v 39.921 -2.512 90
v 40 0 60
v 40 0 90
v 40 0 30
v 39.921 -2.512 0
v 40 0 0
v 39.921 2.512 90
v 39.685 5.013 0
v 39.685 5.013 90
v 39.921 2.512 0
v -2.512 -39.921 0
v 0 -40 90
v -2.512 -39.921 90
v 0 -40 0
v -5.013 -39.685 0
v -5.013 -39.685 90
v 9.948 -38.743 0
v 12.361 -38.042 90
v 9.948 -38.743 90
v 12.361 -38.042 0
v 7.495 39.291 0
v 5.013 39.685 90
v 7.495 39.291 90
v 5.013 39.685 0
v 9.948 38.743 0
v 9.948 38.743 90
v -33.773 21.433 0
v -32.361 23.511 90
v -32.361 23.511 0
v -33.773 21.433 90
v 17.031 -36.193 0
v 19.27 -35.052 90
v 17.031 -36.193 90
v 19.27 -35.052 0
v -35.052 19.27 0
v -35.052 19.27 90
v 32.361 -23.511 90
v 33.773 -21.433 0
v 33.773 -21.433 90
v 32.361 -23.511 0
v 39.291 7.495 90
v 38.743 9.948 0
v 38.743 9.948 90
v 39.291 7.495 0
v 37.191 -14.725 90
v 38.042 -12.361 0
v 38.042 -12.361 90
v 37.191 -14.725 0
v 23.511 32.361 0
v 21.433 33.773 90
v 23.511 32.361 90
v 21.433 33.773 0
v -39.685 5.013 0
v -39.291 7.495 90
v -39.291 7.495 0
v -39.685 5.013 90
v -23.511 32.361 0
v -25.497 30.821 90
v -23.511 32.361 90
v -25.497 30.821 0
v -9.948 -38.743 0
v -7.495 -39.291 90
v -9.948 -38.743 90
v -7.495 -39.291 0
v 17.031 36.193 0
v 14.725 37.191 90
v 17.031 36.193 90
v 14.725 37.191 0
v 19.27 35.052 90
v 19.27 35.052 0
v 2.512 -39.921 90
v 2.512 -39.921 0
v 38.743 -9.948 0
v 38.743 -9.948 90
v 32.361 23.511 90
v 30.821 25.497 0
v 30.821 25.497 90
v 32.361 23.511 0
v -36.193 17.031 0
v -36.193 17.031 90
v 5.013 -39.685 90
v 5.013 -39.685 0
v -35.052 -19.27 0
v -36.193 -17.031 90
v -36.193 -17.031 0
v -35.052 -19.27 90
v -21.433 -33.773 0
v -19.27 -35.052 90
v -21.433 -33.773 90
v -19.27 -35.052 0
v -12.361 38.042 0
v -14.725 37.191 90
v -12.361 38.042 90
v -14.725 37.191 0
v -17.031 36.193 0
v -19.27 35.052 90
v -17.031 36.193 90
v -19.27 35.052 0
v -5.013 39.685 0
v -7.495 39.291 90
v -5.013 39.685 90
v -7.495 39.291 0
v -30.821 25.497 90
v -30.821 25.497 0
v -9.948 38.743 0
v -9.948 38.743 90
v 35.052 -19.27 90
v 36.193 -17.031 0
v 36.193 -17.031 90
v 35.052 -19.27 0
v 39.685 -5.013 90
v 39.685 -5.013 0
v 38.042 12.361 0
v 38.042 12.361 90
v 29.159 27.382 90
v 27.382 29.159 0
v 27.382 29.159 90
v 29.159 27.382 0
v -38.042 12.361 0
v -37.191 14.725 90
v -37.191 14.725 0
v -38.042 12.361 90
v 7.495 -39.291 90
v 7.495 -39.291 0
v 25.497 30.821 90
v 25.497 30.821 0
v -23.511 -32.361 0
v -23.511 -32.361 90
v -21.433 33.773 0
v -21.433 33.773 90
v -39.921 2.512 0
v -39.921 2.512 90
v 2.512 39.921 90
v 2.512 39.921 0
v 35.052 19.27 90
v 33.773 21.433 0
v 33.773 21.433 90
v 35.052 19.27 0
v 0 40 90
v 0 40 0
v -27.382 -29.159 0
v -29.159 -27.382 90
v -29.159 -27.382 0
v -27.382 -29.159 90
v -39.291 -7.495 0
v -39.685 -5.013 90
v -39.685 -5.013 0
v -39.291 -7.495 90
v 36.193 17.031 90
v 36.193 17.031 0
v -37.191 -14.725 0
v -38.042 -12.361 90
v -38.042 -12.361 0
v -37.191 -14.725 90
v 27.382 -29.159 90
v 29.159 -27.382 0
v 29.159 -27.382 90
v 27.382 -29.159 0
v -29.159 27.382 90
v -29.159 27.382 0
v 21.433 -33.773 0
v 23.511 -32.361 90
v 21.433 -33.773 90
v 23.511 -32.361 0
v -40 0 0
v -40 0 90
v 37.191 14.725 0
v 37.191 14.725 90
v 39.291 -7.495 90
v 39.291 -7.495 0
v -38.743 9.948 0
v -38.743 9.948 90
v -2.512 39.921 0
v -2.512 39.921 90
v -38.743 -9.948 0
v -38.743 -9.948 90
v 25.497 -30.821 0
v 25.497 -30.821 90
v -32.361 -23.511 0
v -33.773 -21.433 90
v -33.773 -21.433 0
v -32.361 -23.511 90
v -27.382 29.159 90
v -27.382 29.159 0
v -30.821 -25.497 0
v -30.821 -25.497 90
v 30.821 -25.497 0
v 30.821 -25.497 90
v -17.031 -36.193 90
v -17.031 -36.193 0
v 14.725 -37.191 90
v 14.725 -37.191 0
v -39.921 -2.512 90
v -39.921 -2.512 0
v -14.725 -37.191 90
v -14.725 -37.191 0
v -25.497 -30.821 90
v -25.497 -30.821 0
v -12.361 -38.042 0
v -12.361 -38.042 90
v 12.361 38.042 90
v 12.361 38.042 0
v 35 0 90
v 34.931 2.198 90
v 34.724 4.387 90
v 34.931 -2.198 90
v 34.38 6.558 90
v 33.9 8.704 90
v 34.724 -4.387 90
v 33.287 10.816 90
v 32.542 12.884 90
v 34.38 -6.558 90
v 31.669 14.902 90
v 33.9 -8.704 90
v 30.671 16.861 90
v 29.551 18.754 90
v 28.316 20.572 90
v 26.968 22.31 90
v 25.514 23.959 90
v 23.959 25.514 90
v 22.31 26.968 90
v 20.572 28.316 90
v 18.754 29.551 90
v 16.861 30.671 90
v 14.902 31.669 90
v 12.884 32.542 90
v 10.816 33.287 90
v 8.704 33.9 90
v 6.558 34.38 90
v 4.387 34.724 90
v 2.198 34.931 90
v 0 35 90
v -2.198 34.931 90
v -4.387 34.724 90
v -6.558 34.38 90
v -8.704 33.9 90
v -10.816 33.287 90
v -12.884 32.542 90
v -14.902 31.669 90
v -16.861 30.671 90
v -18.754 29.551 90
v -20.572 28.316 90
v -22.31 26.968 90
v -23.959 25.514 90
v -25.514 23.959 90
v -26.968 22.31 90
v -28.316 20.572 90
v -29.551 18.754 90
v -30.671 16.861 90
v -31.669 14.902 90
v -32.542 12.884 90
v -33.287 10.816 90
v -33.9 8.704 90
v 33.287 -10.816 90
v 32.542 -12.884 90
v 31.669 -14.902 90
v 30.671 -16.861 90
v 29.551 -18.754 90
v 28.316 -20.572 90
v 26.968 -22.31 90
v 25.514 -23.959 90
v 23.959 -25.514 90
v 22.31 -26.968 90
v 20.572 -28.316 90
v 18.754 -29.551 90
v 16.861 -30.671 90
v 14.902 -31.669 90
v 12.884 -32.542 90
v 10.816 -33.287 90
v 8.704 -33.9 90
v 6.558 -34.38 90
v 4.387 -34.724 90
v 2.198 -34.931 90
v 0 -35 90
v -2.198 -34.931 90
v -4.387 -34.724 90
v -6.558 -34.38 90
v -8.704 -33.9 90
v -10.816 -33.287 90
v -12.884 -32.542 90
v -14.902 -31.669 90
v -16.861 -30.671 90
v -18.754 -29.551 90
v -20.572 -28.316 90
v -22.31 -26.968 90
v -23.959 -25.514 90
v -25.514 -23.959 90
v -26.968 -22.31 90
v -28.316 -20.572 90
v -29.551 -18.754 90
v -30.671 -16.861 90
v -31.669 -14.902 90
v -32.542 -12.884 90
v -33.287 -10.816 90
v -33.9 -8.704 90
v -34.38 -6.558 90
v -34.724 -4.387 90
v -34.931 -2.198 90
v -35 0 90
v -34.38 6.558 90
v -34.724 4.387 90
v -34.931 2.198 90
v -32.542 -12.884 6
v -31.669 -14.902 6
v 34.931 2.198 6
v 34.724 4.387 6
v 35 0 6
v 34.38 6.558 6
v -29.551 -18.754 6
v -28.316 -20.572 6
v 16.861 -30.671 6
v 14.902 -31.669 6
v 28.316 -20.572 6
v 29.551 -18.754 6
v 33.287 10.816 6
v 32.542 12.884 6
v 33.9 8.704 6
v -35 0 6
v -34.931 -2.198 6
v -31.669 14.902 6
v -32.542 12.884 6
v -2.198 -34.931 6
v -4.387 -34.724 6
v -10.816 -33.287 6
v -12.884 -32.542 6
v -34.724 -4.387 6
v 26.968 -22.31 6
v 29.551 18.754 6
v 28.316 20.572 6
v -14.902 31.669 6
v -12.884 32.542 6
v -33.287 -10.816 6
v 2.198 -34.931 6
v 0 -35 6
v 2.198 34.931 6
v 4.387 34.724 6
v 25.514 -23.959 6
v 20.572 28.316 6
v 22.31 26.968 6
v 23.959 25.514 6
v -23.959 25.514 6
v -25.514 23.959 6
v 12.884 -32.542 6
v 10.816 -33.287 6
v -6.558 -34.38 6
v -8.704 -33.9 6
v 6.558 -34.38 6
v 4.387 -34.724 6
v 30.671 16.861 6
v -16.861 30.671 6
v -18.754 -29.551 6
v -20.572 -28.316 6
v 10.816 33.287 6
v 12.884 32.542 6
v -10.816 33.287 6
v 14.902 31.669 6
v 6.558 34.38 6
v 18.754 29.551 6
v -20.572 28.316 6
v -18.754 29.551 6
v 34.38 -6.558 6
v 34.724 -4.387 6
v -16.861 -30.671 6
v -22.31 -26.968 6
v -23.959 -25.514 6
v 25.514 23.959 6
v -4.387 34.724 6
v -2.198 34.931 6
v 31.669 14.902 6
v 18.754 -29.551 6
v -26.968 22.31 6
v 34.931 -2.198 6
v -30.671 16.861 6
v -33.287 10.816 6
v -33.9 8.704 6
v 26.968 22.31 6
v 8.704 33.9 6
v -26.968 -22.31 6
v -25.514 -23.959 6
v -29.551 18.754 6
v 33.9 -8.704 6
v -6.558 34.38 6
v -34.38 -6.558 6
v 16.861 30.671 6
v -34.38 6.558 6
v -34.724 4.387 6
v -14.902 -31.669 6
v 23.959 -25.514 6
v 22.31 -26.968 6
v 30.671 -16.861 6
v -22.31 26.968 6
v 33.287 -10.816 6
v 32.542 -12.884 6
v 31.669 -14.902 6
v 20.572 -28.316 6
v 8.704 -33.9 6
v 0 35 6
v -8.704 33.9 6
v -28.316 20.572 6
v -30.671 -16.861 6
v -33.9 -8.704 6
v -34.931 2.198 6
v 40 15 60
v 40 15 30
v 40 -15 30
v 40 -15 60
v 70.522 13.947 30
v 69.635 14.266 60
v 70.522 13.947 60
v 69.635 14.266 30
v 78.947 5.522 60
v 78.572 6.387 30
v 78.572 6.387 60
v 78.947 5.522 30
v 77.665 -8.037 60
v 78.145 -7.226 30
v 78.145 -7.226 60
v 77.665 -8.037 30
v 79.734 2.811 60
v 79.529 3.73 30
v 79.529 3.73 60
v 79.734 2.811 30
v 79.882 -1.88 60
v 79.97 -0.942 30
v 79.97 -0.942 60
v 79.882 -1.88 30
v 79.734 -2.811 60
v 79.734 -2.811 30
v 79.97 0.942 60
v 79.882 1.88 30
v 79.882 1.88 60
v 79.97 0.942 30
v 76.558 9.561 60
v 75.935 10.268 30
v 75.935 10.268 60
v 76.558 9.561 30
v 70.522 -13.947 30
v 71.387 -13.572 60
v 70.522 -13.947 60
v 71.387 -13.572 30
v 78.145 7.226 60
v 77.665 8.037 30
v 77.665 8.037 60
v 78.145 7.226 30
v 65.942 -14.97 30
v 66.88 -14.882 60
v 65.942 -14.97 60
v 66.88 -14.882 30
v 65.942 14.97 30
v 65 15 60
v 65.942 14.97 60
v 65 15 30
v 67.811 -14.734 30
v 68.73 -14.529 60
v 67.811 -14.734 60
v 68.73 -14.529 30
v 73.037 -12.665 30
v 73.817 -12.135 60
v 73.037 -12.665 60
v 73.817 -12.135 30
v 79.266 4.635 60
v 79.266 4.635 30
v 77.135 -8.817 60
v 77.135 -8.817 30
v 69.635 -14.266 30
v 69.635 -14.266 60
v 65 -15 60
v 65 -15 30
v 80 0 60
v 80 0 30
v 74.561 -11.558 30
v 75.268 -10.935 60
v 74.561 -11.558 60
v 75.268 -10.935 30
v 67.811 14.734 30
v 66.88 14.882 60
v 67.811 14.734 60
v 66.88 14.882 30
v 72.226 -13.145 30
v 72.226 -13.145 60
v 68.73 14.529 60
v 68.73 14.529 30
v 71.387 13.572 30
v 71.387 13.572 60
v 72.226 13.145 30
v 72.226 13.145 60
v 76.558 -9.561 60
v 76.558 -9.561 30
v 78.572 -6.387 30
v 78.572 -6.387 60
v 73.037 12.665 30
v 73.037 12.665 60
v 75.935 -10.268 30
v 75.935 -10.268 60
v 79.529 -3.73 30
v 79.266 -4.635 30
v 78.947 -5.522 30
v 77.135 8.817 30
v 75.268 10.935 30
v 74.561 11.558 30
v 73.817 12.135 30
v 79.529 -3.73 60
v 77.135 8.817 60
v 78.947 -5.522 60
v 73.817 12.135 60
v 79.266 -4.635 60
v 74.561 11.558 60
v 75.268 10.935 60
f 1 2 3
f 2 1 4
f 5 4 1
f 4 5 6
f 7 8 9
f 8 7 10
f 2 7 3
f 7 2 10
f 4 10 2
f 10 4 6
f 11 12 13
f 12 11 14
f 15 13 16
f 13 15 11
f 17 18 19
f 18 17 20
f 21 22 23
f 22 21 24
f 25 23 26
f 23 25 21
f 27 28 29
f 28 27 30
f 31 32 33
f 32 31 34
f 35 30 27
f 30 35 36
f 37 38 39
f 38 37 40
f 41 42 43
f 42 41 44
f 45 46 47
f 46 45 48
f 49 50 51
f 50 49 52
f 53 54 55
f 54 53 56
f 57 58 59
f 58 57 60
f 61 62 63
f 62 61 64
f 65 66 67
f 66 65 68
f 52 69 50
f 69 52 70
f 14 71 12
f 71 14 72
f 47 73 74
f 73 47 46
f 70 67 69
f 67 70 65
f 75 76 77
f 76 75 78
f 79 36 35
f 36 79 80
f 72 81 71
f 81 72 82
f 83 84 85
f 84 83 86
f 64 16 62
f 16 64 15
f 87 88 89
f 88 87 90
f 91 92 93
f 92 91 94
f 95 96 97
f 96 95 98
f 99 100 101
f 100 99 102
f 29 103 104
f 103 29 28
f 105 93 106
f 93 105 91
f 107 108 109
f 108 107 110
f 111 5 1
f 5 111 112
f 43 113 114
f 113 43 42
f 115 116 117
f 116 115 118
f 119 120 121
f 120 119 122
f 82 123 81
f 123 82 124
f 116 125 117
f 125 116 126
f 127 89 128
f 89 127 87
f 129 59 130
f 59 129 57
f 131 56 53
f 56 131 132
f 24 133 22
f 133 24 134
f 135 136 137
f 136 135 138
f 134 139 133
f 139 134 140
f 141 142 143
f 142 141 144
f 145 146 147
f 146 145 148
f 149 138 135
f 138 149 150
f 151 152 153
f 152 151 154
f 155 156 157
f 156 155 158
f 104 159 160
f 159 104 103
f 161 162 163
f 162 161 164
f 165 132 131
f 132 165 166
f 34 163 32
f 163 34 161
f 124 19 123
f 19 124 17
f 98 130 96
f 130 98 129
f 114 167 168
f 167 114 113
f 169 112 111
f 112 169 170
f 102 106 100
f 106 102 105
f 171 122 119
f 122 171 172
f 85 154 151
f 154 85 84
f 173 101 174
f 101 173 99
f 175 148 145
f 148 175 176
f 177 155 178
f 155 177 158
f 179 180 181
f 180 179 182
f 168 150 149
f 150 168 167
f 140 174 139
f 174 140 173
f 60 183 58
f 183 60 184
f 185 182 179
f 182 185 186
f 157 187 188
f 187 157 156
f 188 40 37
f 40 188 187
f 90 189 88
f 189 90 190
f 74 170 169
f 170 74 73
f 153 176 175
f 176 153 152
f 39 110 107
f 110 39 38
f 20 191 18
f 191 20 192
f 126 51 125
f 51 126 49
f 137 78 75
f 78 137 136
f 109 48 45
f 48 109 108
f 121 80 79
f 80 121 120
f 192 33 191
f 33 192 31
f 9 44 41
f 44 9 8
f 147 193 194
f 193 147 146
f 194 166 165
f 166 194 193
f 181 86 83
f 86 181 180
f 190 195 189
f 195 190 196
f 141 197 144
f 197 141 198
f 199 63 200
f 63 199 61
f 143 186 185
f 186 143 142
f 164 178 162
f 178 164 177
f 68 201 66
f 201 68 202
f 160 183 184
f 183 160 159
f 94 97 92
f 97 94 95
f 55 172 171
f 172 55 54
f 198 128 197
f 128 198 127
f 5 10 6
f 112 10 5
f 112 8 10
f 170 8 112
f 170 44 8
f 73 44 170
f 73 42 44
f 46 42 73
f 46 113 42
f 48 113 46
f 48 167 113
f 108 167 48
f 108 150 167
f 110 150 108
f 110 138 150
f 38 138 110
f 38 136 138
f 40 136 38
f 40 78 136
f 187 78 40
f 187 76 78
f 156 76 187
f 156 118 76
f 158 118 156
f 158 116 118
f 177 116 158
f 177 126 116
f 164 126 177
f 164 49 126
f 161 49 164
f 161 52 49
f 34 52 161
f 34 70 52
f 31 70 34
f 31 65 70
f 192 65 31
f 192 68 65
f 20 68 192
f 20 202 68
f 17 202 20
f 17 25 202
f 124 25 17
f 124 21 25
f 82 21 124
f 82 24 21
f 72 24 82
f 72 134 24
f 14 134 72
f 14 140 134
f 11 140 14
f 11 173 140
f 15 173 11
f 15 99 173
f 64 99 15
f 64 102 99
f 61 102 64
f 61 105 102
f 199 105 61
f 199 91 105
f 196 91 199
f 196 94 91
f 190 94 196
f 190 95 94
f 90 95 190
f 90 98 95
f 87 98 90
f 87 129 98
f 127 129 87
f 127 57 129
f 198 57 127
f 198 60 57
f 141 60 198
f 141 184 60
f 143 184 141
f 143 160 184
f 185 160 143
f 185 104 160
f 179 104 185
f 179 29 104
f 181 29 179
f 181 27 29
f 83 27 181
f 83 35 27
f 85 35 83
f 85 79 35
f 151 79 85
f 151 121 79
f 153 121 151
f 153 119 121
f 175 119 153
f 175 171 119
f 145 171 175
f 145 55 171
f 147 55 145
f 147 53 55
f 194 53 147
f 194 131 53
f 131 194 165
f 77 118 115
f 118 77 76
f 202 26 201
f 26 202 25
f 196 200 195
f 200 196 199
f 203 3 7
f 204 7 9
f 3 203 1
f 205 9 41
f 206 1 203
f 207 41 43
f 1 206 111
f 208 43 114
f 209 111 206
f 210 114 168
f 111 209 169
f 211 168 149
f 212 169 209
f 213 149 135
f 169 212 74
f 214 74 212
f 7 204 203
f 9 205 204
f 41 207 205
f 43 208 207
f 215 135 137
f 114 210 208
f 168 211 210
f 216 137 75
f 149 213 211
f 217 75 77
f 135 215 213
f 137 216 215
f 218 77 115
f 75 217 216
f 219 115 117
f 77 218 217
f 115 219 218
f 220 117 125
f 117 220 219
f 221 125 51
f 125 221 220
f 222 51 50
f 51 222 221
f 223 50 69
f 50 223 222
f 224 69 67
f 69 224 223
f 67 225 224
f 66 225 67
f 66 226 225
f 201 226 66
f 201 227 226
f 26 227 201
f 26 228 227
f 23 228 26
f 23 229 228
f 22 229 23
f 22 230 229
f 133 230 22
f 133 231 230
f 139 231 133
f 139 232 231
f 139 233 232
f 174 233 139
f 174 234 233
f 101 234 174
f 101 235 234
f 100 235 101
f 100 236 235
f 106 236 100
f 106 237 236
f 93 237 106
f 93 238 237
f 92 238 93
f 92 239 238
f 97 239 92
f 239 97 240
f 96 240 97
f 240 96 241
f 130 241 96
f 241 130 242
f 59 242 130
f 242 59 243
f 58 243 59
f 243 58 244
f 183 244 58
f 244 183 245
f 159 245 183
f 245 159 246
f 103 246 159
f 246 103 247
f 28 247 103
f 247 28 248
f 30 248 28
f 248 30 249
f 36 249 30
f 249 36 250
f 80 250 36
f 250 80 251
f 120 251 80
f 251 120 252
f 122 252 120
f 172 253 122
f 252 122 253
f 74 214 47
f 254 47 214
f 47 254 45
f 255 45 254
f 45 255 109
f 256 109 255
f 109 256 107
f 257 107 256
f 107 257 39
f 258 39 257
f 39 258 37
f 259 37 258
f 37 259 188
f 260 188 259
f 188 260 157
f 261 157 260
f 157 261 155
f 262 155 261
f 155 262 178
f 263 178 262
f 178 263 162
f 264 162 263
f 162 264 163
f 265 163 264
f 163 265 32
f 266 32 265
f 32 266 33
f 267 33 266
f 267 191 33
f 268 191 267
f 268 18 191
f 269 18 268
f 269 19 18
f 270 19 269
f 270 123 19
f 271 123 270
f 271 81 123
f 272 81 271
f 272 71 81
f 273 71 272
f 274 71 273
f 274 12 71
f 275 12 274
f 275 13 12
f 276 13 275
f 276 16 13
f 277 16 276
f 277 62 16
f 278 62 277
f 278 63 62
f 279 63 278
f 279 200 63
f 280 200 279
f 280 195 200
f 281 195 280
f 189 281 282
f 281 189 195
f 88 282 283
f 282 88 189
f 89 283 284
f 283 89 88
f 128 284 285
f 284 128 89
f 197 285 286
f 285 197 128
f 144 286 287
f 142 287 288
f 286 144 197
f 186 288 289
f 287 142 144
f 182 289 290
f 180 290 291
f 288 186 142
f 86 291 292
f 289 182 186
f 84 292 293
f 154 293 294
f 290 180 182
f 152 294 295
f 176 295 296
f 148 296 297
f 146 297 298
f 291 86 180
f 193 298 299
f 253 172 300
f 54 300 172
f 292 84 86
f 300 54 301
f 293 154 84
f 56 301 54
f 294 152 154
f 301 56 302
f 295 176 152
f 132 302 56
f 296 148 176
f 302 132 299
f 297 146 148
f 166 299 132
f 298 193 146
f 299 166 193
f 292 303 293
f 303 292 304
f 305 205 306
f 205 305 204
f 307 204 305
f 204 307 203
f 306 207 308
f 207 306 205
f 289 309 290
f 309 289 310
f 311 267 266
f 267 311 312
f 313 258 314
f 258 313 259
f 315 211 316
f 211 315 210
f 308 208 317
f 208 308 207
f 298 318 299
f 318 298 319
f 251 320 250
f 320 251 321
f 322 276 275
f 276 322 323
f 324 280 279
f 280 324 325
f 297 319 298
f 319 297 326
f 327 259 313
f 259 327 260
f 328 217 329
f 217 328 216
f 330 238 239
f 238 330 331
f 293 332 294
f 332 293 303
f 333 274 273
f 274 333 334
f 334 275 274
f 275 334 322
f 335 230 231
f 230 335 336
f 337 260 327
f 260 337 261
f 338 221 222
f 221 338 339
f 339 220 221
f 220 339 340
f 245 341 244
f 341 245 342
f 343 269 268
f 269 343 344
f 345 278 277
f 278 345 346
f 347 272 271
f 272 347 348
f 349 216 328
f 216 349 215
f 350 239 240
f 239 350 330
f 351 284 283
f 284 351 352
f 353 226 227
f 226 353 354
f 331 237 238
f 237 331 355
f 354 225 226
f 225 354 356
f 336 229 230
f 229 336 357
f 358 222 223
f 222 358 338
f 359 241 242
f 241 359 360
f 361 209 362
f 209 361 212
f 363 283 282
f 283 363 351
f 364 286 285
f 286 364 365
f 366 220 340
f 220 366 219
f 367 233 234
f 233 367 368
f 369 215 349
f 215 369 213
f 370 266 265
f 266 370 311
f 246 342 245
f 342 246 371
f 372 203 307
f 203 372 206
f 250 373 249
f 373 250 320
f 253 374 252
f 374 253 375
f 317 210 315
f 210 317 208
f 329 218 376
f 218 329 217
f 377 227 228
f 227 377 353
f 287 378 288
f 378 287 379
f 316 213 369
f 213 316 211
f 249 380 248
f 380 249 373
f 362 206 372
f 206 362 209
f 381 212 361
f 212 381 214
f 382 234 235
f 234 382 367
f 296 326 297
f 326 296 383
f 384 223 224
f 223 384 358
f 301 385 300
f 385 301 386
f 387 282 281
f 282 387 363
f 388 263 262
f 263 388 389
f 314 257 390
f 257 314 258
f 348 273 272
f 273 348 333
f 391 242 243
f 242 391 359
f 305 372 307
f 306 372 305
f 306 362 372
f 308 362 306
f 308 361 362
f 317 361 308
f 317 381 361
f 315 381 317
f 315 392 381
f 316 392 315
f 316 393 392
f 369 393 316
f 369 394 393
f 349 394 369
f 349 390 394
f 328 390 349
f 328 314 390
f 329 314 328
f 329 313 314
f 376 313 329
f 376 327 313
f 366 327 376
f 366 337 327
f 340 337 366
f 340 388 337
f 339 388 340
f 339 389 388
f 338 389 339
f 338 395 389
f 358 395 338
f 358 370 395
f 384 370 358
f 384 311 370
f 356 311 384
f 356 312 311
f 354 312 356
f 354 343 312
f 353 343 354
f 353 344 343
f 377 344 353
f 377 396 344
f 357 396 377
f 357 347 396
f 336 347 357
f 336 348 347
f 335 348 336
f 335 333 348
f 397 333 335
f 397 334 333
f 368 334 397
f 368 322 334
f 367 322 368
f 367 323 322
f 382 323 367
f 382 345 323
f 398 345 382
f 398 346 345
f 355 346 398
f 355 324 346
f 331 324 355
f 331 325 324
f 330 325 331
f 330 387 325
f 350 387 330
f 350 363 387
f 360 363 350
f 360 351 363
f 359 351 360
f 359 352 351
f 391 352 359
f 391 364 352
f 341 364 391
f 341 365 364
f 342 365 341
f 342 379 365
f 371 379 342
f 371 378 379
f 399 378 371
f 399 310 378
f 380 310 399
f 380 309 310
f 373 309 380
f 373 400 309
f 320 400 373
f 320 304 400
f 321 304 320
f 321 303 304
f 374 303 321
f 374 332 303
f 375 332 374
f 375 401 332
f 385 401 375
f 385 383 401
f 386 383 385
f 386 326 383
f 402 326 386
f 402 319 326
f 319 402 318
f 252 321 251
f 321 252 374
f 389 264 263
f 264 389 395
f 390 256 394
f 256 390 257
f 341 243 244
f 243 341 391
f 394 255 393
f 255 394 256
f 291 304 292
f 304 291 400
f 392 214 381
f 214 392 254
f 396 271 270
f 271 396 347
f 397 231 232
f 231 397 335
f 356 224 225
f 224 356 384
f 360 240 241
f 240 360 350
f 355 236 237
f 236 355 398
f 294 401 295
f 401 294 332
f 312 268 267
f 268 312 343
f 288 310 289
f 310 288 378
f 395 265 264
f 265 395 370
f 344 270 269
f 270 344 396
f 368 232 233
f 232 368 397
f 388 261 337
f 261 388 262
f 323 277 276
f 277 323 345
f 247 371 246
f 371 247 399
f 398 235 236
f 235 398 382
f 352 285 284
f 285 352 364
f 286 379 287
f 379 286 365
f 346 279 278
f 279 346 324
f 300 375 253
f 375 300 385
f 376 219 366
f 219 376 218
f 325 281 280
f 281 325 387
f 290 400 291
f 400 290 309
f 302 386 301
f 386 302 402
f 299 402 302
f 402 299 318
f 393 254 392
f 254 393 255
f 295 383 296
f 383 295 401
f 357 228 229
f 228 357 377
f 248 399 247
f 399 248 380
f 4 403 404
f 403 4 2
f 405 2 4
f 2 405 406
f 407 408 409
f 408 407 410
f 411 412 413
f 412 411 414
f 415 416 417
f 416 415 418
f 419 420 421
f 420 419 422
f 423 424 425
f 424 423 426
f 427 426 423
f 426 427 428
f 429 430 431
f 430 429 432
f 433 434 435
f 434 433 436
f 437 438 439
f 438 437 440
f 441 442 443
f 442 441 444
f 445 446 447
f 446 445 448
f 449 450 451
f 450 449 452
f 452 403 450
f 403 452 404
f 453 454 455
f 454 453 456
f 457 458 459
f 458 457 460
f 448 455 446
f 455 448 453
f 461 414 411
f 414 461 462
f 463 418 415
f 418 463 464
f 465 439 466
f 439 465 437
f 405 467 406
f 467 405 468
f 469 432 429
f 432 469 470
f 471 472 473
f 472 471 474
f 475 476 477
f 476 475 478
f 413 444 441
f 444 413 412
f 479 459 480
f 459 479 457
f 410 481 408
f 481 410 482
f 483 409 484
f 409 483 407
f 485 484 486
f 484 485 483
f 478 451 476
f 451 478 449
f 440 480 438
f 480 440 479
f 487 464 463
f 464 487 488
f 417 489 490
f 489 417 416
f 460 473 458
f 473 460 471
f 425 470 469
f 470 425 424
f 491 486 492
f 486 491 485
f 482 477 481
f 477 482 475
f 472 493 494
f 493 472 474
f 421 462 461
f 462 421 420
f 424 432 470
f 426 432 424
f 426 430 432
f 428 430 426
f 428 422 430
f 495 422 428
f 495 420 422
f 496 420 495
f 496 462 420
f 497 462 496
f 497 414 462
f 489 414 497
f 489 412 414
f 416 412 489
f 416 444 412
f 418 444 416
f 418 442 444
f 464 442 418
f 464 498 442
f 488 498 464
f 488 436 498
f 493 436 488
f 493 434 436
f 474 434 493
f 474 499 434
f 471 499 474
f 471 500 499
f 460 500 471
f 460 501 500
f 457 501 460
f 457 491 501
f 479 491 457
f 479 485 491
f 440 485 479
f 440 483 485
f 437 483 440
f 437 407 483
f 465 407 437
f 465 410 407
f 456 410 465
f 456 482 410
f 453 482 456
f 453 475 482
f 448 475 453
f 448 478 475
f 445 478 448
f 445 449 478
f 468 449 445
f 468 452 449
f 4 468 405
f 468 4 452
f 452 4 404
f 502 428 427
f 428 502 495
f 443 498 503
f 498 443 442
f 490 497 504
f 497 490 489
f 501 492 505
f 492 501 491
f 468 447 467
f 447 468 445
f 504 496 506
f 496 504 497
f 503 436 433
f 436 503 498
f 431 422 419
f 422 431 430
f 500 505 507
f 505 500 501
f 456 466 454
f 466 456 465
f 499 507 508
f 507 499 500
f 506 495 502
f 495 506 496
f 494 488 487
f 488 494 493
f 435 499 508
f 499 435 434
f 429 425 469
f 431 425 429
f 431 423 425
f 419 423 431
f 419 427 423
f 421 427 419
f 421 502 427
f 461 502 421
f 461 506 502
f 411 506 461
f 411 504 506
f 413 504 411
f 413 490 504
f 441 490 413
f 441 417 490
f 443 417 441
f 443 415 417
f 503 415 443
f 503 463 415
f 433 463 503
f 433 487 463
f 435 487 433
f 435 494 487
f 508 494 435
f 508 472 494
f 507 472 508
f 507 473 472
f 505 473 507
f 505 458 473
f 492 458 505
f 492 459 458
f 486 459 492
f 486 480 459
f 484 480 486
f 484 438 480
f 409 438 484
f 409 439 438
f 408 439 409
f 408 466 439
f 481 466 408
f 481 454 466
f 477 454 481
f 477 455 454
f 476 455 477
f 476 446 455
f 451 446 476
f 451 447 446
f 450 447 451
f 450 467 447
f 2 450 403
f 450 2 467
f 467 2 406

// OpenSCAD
// mug with D‐shaped handle on +X side
outer_d        = 80;   // outer diameter of mug
inner_d        = 70;   // inner diameter of mug
height         = 90;   // total mug height
bottom_thick   = 6;    // bottom thickness
open_w         = 25;   // finger‐hole width
open_h         = 30;   // finger‐hole height
h_thick        = open_h/2;  // half the hole height for D‐shape radius
$fn            = 100;  // resolution

module mug() {
  difference() {
    // outer shell
    cylinder(d = outer_d, h = height, $fn = $fn);
    // hollow interior
    translate([0, 0, bottom_thick])
      cylinder(d = inner_d, h = height - bottom_thick, $fn = $fn);
  }
}

module handle2d() {
  // 2D profile of the D‐shape (in the X–Y plane)
  inner_x      = outer_d/2;           // flat‐face at mug outer
  arc_cx       = inner_x + open_w;    // center of semicircle
  union() {
    // rectangular segment from flat face to start of arc
    translate([inner_x, -h_thick])
      square([open_w, 2*h_thick], center = false);
    // outer semicircle (right half of a full circle)
    intersection() {
      translate([arc_cx, 0])
        circle(r = h_thick, $fn = $fn);
      // clip to x >= arc_cx (to keep only the right half)
      translate([arc_cx, -100])
        square([h_thick, 200], center = false);
    }
  }
}

module handle() {
  // place handle at mid‐height, extrude the 2D D‐profile by open_h
  translate([0, 0, height/2 - open_h/2])
    linear_extrude(height = open_h)
      handle2d();
}

union() {
  mug();
  handle();
}
